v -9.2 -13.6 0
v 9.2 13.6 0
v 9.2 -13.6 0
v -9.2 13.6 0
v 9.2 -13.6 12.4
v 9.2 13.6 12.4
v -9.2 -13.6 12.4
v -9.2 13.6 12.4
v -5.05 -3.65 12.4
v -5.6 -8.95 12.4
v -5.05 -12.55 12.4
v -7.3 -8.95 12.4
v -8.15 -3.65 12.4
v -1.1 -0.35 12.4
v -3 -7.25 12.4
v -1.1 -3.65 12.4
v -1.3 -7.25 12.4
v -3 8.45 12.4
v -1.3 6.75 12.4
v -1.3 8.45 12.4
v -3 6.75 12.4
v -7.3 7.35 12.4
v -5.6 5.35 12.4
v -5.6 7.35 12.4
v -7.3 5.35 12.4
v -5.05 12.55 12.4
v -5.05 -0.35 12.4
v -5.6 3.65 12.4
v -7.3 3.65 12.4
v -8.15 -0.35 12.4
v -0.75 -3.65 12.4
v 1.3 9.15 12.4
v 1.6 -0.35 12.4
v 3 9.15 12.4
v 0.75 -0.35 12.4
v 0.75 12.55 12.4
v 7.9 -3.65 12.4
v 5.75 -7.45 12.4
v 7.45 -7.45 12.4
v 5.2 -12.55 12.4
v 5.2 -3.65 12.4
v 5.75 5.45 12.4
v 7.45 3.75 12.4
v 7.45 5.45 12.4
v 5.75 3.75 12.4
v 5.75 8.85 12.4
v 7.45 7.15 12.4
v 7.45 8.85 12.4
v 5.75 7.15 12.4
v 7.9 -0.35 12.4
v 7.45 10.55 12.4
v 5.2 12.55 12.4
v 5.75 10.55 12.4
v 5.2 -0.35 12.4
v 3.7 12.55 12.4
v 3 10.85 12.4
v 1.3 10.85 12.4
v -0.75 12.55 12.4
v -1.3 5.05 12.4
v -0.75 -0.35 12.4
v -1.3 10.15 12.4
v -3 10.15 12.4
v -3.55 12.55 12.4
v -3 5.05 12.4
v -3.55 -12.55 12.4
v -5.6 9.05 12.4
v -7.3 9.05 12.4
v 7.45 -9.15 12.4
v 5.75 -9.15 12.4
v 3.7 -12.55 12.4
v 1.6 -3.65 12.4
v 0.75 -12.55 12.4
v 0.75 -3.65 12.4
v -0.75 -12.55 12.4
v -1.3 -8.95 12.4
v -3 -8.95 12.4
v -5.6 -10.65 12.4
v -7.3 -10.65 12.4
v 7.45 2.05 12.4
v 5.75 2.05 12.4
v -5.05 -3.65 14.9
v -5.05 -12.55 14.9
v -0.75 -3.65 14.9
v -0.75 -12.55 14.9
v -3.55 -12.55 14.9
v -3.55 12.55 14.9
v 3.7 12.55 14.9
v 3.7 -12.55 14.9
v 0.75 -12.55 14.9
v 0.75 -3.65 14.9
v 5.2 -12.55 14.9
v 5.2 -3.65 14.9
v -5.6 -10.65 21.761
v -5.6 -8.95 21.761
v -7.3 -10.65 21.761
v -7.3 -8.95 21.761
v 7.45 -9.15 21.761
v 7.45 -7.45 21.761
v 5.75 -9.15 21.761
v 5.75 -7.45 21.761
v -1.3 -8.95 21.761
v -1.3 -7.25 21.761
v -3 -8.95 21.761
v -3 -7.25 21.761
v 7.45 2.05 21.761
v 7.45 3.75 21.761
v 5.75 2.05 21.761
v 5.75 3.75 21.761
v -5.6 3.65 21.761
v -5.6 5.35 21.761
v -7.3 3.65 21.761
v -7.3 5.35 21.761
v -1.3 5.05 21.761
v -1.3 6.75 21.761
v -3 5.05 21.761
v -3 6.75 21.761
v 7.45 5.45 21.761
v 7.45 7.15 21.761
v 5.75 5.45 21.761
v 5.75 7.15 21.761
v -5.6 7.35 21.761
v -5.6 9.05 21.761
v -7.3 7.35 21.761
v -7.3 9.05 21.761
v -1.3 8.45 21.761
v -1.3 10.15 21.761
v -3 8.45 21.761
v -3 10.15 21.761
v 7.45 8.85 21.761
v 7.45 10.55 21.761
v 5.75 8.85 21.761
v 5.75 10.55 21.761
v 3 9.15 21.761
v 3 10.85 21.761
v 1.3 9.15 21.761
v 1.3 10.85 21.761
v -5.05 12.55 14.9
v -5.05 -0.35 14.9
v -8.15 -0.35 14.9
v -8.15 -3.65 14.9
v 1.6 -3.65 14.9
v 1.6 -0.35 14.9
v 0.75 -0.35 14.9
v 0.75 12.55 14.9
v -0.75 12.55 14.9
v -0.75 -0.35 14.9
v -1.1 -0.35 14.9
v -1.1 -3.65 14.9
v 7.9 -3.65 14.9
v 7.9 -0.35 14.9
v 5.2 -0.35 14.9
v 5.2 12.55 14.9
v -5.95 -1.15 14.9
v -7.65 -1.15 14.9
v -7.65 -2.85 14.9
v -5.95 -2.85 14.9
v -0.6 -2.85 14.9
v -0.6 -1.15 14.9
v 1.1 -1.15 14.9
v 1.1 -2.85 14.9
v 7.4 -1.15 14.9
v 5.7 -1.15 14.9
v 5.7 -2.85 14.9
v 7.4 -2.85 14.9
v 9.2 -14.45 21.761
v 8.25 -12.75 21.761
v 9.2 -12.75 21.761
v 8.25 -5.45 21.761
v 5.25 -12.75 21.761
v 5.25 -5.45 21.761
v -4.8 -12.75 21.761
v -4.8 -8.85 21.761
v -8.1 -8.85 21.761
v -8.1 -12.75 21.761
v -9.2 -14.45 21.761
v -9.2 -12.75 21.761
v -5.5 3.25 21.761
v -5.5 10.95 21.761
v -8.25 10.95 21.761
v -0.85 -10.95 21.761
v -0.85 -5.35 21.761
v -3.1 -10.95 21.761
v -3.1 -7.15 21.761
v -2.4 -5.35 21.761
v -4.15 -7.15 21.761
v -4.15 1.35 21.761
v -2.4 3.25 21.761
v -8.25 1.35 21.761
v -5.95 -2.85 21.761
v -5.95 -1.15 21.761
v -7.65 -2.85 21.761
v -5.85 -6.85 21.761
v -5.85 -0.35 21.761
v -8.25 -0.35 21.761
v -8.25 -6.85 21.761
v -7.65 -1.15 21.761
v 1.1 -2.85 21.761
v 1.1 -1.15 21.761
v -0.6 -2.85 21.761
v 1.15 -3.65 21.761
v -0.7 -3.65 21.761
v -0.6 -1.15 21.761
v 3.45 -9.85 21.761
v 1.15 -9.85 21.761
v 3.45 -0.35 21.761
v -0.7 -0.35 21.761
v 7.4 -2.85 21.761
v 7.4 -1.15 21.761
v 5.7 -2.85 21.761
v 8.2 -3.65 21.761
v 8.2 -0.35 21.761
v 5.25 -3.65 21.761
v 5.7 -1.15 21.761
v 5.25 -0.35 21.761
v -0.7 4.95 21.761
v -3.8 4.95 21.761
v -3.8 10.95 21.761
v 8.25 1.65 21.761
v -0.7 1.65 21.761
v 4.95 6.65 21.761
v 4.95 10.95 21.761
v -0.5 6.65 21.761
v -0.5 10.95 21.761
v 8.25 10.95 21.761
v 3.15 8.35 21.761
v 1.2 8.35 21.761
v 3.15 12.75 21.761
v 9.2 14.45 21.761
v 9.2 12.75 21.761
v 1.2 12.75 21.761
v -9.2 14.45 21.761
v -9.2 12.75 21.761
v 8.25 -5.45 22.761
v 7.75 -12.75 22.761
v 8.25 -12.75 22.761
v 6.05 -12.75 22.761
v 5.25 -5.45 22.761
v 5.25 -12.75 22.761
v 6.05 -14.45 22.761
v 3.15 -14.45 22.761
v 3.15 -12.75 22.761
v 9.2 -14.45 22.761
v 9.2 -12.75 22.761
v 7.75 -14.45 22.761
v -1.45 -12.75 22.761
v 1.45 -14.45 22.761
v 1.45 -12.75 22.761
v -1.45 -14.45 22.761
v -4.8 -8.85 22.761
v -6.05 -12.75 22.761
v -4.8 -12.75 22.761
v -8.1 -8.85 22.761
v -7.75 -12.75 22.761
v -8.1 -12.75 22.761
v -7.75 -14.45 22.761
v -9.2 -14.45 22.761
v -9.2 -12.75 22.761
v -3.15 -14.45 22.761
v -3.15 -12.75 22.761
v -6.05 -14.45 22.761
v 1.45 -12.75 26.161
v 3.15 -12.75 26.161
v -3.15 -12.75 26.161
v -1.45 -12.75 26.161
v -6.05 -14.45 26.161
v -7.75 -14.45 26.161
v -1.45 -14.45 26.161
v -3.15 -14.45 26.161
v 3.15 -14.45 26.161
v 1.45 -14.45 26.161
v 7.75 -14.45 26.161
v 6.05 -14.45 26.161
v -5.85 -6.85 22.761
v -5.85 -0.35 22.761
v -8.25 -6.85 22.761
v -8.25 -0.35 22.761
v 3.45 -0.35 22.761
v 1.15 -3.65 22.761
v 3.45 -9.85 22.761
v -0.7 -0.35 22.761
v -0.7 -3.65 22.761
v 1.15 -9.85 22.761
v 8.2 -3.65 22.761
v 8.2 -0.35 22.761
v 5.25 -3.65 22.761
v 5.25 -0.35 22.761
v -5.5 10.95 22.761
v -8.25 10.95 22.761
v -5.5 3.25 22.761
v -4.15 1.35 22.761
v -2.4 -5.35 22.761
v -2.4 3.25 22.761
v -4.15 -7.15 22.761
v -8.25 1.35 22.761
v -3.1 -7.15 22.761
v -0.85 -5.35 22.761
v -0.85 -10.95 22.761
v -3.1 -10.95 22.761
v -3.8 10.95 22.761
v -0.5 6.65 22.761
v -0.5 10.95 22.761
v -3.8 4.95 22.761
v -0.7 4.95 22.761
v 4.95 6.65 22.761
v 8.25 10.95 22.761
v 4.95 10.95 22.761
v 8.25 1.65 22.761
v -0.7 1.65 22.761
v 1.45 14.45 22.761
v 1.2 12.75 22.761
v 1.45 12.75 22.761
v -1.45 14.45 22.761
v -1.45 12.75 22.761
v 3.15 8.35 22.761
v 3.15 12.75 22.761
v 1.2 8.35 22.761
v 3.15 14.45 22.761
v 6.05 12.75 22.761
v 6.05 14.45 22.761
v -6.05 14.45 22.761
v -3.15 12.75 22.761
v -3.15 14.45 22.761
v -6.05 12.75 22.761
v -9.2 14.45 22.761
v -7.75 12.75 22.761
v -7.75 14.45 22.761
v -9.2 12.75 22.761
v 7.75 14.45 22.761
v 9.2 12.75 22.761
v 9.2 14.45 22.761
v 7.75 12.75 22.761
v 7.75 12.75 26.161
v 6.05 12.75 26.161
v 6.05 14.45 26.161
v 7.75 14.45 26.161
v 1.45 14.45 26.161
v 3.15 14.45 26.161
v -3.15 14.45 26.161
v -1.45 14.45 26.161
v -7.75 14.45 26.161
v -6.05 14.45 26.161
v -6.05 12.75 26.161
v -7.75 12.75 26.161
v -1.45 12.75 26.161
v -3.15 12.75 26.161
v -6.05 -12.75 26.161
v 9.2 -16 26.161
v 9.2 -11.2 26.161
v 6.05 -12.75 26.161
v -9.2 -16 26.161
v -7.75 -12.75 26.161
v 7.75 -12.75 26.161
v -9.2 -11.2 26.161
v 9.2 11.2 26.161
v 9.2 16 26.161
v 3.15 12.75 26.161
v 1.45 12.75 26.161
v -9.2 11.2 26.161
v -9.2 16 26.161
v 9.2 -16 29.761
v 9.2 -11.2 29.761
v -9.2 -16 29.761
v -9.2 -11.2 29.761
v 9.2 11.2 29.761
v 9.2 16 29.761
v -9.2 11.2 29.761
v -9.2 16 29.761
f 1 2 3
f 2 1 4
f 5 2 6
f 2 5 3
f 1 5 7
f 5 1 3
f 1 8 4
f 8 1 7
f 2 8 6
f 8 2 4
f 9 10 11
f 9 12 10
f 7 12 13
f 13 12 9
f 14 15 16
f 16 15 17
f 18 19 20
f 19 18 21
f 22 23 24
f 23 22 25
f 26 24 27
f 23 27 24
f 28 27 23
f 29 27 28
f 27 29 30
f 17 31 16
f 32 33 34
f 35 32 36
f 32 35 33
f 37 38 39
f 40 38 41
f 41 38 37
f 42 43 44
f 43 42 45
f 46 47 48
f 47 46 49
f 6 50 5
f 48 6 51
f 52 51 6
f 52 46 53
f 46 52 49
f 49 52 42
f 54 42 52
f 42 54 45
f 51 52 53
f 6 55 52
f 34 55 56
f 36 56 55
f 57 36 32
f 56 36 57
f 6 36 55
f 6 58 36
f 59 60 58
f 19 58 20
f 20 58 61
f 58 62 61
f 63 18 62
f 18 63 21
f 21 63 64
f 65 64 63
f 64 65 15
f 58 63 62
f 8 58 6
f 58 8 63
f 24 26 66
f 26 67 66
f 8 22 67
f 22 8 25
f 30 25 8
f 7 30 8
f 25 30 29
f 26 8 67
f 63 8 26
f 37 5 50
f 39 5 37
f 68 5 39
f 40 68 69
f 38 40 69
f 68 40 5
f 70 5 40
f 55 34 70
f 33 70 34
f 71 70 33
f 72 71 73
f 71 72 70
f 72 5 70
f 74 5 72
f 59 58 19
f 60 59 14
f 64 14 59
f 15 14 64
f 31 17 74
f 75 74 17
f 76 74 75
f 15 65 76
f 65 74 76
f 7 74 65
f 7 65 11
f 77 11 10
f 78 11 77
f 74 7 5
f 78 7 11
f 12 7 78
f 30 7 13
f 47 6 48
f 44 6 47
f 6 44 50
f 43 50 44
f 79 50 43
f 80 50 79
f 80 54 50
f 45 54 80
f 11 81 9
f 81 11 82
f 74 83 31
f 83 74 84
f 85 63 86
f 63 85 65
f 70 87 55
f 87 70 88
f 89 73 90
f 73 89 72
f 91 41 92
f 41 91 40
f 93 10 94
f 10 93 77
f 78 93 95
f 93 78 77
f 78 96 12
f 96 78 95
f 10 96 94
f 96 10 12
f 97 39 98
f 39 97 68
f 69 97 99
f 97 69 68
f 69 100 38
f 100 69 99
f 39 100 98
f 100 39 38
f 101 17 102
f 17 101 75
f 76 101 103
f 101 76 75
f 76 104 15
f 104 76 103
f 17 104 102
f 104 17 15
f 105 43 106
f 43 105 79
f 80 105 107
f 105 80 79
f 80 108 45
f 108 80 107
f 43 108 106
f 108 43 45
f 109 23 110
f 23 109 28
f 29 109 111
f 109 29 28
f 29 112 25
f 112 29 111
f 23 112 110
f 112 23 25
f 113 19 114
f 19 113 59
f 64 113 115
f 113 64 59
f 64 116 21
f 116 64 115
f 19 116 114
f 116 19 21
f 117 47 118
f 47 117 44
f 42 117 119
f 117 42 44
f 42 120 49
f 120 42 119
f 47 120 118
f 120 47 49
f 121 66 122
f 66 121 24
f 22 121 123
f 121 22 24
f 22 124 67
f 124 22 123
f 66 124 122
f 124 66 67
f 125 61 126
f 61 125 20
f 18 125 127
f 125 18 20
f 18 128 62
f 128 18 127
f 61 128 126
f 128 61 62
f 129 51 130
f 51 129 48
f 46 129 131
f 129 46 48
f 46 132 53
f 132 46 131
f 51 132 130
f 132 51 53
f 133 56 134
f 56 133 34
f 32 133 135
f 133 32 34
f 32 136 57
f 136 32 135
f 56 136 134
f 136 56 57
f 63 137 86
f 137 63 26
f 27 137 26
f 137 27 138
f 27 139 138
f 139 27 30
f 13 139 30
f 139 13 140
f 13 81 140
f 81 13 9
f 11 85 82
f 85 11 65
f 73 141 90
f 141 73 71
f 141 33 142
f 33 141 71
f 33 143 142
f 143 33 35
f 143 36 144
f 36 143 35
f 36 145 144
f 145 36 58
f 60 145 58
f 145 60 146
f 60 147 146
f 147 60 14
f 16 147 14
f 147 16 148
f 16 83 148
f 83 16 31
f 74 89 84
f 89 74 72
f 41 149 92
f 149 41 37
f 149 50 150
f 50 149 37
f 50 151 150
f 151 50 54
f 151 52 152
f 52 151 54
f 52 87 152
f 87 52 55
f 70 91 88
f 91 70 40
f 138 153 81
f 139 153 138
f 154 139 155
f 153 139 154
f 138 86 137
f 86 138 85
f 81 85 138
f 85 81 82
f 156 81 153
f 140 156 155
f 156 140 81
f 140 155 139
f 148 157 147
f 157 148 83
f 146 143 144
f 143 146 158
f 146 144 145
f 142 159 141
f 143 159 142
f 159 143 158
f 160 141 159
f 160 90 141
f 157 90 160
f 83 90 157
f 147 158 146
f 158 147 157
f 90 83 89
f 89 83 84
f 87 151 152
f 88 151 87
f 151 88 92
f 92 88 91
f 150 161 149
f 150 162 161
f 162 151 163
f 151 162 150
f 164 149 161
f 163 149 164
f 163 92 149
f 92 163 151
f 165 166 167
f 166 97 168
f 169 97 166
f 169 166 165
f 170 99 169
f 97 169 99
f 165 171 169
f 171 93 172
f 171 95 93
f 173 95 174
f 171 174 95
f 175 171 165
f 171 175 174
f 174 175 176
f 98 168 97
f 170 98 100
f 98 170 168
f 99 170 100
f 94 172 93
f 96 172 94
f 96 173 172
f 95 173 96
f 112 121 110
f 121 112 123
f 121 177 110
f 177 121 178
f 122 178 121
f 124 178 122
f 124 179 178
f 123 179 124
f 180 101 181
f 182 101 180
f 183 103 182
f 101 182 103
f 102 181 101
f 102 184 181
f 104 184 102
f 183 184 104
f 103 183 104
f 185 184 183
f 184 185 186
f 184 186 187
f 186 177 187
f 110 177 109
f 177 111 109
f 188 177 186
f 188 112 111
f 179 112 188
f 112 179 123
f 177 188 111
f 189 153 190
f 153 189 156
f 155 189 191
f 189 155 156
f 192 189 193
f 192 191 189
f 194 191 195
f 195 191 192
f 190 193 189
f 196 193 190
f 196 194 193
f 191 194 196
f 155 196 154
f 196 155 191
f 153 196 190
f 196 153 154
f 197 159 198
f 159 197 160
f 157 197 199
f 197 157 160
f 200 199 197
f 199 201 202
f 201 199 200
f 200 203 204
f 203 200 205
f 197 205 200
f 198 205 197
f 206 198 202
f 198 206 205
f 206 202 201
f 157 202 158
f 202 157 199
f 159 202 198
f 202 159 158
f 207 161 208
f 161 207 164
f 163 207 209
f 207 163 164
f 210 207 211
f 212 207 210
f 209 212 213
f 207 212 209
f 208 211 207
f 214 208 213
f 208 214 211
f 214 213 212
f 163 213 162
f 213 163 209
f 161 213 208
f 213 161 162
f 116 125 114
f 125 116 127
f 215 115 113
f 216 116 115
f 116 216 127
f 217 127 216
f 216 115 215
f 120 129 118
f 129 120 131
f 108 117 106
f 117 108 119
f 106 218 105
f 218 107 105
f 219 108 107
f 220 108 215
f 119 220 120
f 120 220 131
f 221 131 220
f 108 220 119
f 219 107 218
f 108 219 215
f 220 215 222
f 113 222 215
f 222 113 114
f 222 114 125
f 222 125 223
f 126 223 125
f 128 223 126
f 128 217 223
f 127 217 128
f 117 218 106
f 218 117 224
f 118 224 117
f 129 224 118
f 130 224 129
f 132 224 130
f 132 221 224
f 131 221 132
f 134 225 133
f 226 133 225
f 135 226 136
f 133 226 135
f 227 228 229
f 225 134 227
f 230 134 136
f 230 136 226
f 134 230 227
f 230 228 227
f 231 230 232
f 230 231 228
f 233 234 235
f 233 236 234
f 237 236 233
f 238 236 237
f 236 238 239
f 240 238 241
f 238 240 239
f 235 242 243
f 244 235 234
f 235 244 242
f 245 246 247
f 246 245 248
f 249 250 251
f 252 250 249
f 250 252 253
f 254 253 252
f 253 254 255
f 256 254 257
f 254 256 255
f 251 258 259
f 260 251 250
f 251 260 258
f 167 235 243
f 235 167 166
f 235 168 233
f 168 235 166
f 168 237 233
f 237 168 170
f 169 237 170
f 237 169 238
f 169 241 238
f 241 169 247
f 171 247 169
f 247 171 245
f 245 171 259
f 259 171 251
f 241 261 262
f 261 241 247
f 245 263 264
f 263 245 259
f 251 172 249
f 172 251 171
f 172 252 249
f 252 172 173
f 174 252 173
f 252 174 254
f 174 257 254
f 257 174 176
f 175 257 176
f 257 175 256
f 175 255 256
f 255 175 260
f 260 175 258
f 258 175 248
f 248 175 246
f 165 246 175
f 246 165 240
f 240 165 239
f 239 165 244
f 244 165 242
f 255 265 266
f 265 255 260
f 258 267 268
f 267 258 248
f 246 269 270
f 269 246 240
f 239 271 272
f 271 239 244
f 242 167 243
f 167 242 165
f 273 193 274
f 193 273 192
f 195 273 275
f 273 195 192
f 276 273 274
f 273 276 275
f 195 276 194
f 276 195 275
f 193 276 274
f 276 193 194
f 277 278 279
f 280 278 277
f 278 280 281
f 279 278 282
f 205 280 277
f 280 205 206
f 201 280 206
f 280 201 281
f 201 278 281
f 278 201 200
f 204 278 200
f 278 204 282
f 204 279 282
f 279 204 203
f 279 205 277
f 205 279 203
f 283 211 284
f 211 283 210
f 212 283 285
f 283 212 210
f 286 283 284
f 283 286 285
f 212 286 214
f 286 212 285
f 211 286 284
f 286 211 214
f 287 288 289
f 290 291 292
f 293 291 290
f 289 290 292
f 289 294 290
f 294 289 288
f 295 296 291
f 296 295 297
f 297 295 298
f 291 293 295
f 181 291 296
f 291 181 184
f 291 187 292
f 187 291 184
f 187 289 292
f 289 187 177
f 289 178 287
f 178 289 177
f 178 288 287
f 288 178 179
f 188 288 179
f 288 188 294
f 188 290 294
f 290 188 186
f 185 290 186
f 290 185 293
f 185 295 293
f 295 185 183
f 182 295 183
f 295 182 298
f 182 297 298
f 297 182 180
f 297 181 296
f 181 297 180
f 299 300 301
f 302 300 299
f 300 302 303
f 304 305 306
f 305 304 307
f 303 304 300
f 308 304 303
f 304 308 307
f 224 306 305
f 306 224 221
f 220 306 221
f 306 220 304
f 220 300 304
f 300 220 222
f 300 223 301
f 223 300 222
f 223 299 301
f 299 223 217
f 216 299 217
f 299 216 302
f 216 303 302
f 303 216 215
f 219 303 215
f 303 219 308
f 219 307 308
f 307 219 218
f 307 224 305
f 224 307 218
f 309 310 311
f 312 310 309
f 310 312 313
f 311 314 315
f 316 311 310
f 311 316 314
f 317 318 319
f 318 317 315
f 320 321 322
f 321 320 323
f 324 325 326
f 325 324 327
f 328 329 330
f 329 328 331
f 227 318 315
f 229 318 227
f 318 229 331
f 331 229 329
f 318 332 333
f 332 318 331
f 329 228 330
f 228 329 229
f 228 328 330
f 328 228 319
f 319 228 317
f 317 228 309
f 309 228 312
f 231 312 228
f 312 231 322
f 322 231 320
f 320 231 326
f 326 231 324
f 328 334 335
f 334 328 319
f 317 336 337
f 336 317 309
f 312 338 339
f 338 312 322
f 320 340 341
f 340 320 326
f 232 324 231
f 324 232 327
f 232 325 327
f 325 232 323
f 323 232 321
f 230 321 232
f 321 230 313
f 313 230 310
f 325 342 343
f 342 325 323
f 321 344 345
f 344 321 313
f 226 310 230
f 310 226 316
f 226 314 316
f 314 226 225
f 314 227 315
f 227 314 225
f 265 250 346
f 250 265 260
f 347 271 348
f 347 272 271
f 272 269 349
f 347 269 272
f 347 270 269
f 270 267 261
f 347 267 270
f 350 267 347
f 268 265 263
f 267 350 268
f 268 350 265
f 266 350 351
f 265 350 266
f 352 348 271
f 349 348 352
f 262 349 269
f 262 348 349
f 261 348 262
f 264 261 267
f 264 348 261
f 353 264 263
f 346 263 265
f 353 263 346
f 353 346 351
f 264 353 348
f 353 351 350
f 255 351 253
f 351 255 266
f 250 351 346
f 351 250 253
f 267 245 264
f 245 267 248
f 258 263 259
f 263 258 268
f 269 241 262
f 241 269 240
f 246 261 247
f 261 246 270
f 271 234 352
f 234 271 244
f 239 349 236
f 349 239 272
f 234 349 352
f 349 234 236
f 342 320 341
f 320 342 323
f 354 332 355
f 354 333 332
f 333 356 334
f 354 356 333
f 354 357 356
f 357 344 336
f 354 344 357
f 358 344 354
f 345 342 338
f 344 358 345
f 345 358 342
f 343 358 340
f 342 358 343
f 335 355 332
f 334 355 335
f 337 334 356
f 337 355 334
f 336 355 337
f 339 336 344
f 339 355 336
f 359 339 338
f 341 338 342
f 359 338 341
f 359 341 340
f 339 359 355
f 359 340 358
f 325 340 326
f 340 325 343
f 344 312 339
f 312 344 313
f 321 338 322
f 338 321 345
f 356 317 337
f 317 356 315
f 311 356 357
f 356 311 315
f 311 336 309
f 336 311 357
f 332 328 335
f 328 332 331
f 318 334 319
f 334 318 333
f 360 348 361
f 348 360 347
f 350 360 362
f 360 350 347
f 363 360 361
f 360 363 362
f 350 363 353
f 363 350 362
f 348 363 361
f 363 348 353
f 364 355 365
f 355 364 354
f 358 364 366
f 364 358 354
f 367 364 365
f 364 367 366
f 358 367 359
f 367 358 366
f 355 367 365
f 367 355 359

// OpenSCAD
// Generated by SolidPython 0.4.2 on 2020-09-29 23:19:43
//!OpenSCAD

scale(v = 0.0100000000) {
	translate(v = [-920, -1360, 0]) {
		union() {
			color(c = [0.4000000000, 0.4000000000, 0.4000000000]) {
				translate(v = [0, 0, 0]) {
					linear_extrude(height = 1000.0000000000) {
						polygon(paths = [[0, 1, 2, 3]], points = [[0, 0], [0, 2720], [1840, 2720], [1840, 0]]);
					}
				}
			}
			color(c = [0.2000000000, 0.6000000000, 0.2000000000]) {
				translate(v = [0, 0, 1000.0000000000]) {
					linear_extrude(height = 120.0000000000) {
						polygon(paths = [[0, 1, 2, 3]], points = [[0, 1305], [0, 2720], [1840, 2720], [1840, 1305]]);
					}
				}
			}
			color(c = [0.4000000000, 0.4000000000, 0.4000000000]) {
				translate(v = [0, 0, 1000.0000000000]) {
					linear_extrude(height = 120.0000000000) {
						polygon(paths = [[0, 1, 2, 3]], points = [[0, 0], [0, 1305], [1840, 1305], [1840, 0]]);
					}
				}
			}
			color(c = [0.9000000000, 0.6000000000, 0.6000000000]) {
				translate(v = [0, 0, 1120.0000000000]) {
					linear_extrude(height = 120.0000000000) {
						polygon(paths = [[0, 1, 2, 3]], points = [[150, 1485], [150, 2485], [415, 2485], [415, 1485]]);
					}
				}
			}
			color(c = [0.9000000000, 0.6000000000, 0.6000000000]) {
				translate(v = [0, 0, 1120.0000000000]) {
					linear_extrude(height = 120.0000000000) {
						polygon(paths = [[0, 1, 2, 3]], points = [[565, 1485], [565, 2485], [845, 2485], [845, 1485]]);
					}
				}
			}
			color(c = [0.9000000000, 0.6000000000, 0.6000000000]) {
				translate(v = [0, 0, 1120.0000000000]) {
					linear_extrude(height = 120.0000000000) {
						polygon(paths = [[0, 1, 2, 3]], points = [[995, 1485], [995, 2485], [1290, 2485], [1290, 1485]]);
					}
				}
			}
			color(c = [0.9000000000, 0.6000000000, 0.6000000000]) {
				translate(v = [0, 0, 1120.0000000000]) {
					linear_extrude(height = 120.0000000000) {
						polygon(paths = [[0, 1, 2, 3]], points = [[1440, 1485], [1440, 2485], [1705, 2485], [1705, 1485]]);
					}
				}
			}
			color(c = [0.9000000000, 0.6000000000, 0.9000000000]) {
				translate(v = [0, 0, 1120.0000000000]) {
					linear_extrude(height = 120.0000000000) {
						polygon(paths = [[0, 1, 2, 3]], points = [[150, 235], [150, 885], [415, 885], [415, 235]]);
					}
				}
			}
			color(c = [0.9000000000, 0.6000000000, 0.9000000000]) {
				translate(v = [0, 0, 1120.0000000000]) {
					linear_extrude(height = 120.0000000000) {
						polygon(paths = [[0, 1, 2, 3]], points = [[565, 235], [565, 885], [845, 885], [845, 235]]);
					}
				}
			}
			color(c = [0.9000000000, 0.6000000000, 0.9000000000]) {
				translate(v = [0, 0, 1120.0000000000]) {
					linear_extrude(height = 120.0000000000) {
						polygon(paths = [[0, 1, 2, 3]], points = [[995, 235], [995, 885], [1290, 885], [1290, 235]]);
					}
				}
			}
			color(c = [0.9000000000, 0.6000000000, 0.9000000000]) {
				translate(v = [0, 0, 1120.0000000000]) {
					linear_extrude(height = 120.0000000000) {
						polygon(paths = [[0, 1, 2, 3]], points = [[1440, 235], [1440, 885], [1705, 885], [1705, 235]]);
					}
				}
			}
			color(c = [0.2000000000, 0.6000000000, 0.2000000000]) {
				translate(v = [0, 0, 1120.0000000000]) {
					linear_extrude(height = 120.0000000000) {
						difference() {
							polygon(paths = [[0, 1, 2, 3]], points = [[0, 1305], [0, 2720], [1840, 2720], [1840, 1305]]);
							polygon(paths = [[0, 1, 2, 3]], points = [[150, 1485], [415, 1485], [415, 2485], [150, 2485]]);
							polygon(paths = [[0, 1, 2, 3]], points = [[565, 1485], [845, 1485], [845, 2485], [565, 2485]]);
							polygon(paths = [[0, 1, 2, 3]], points = [[995, 1485], [1290, 1485], [1290, 2485], [995, 2485]]);
							polygon(paths = [[0, 1, 2, 3]], points = [[1440, 1485], [1705, 1485], [1705, 2485], [1440, 2485]]);
						}
					}
				}
			}
			color(c = [0.4000000000, 0.4000000000, 0.4000000000]) {
				translate(v = [0, 0, 1120.0000000000]) {
					linear_extrude(height = 120.0000000000) {
						difference() {
							polygon(paths = [[0, 1, 2, 3]], points = [[0, 0], [0, 1305], [1840, 1305], [1840, 0]]);
							polygon(paths = [[0, 1, 2, 3]], points = [[150, 235], [415, 235], [415, 885], [150, 885]]);
							polygon(paths = [[0, 1, 2, 3]], points = [[565, 235], [845, 235], [845, 885], [565, 885]]);
							polygon(paths = [[0, 1, 2, 3]], points = [[995, 235], [1290, 235], [1290, 885], [995, 885]]);
							polygon(paths = [[0, 1, 2, 3]], points = [[1440, 235], [1705, 235], [1705, 885], [1440, 885]]);
						}
					}
				}
			}
			color(c = [0.1000000000, 0.1000000000, 0.1000000000]) {
				translate(v = [0, 0, 1240.0000000000]) {
					linear_extrude(height = 70.0000000000) {
						polygon(paths = [[0, 1, 2, 3]], points = [[190, 295], [190, 465], [360, 465], [360, 295]]);
					}
				}
			}
			color(c = [0.1000000000, 0.1000000000, 0.1000000000]) {
				translate(v = [0, 0, 1240.0000000000]) {
					linear_extrude(height = 70.0000000000) {
						polygon(paths = [[0, 1, 2, 3]], points = [[1495, 445], [1495, 615], [1665, 615], [1665, 445]]);
					}
				}
			}
			color(c = [0.1000000000, 0.1000000000, 0.1000000000]) {
				translate(v = [0, 0, 1240.0000000000]) {
					linear_extrude(height = 70.0000000000) {
						polygon(paths = [[0, 1, 2, 3]], points = [[620, 465], [620, 635], [790, 635], [790, 465]]);
					}
				}
			}
			color(c = [0.1000000000, 0.1000000000, 0.1000000000]) {
				translate(v = [0, 0, 1240.0000000000]) {
					linear_extrude(height = 70.0000000000) {
						polygon(paths = [[0, 1, 2, 3]], points = [[1495, 1565], [1495, 1735], [1665, 1735], [1665, 1565]]);
					}
				}
			}
			color(c = [0.1000000000, 0.1000000000, 0.1000000000]) {
				translate(v = [0, 0, 1240.0000000000]) {
					linear_extrude(height = 70.0000000000) {
						polygon(paths = [[0, 1, 2, 3]], points = [[190, 1725], [190, 1895], [360, 1895], [360, 1725]]);
					}
				}
			}
			color(c = [0.1000000000, 0.1000000000, 0.1000000000]) {
				translate(v = [0, 0, 1240.0000000000]) {
					linear_extrude(height = 70.0000000000) {
						polygon(paths = [[0, 1, 2, 3]], points = [[620, 1865], [620, 2035], [790, 2035], [790, 1865]]);
					}
				}
			}
			color(c = [0.1000000000, 0.1000000000, 0.1000000000]) {
				translate(v = [0, 0, 1240.0000000000]) {
					linear_extrude(height = 70.0000000000) {
						polygon(paths = [[0, 1, 2, 3]], points = [[1495, 1905], [1495, 2075], [1665, 2075], [1665, 1905]]);
					}
				}
			}
			color(c = [0.1000000000, 0.1000000000, 0.1000000000]) {
				translate(v = [0, 0, 1240.0000000000]) {
					linear_extrude(height = 70.0000000000) {
						polygon(paths = [[0, 1, 2, 3]], points = [[190, 2095], [190, 2265], [360, 2265], [360, 2095]]);
					}
				}
			}
			color(c = [0.1000000000, 0.1000000000, 0.1000000000]) {
				translate(v = [0, 0, 1240.0000000000]) {
					linear_extrude(height = 70.0000000000) {
						polygon(paths = [[0, 1, 2, 3]], points = [[620, 2205], [620, 2375], [790, 2375], [790, 2205]]);
					}
				}
			}
			color(c = [0.1000000000, 0.1000000000, 0.1000000000]) {
				translate(v = [0, 0, 1240.0000000000]) {
					linear_extrude(height = 70.0000000000) {
						polygon(paths = [[0, 1, 2, 3]], points = [[1495, 2245], [1495, 2415], [1665, 2415], [1665, 2245]]);
					}
				}
			}
			color(c = [0.1000000000, 0.1000000000, 0.1000000000]) {
				translate(v = [0, 0, 1240.0000000000]) {
					linear_extrude(height = 70.0000000000) {
						polygon(paths = [[0, 1, 2, 3]], points = [[1050, 2275], [1050, 2445], [1220, 2445], [1220, 2275]]);
					}
				}
			}
			color(c = [1.0000000000, 1.0000000000, 1.0000000000]) {
				translate(v = [0, 0, 1240.0000000000]) {
					linear_extrude(height = 70.0000000000) {
						polygon(paths = [[0, 1, 2, 3, 4, 5, 6, 7]], points = [[415, 105], [415, 995], [105, 995], [105, 1325], [415, 1325], [415, 2615], [565, 2615], [565, 105]]);
					}
				}
			}
			color(c = [1.0000000000, 1.0000000000, 1.0000000000]) {
				translate(v = [0, 0, 1240.0000000000]) {
					linear_extrude(height = 70.0000000000) {
						polygon(paths = [[0, 1, 2, 3, 4, 5, 6, 7, 8, 9, 10, 11]], points = [[845, 105], [845, 995], [810, 995], [810, 1325], [845, 1325], [845, 2615], [995, 2615], [995, 1325], [1080, 1325], [1080, 995], [995, 995], [995, 105]]);
					}
				}
			}
			color(c = [1.0000000000, 1.0000000000, 1.0000000000]) {
				translate(v = [0, 0, 1240.0000000000]) {
					linear_extrude(height = 70.0000000000) {
						polygon(paths = [[0, 1, 2, 3, 4, 5, 6, 7]], points = [[1290, 105], [1290, 2615], [1440, 2615], [1440, 1325], [1710, 1325], [1710, 995], [1440, 995], [1440, 105]]);
					}
				}
			}
			color(c = [0.1000000000, 0.1000000000, 0.1000000000]) {
				translate(v = [0, 0, 1310.0000000000]) {
					linear_extrude(height = 180.0000000000) {
						polygon(paths = [[0, 1, 2, 3]], points = [[190, 295], [190, 465], [360, 465], [360, 295]]);
					}
				}
			}
			color(c = [0.1000000000, 0.1000000000, 0.1000000000]) {
				translate(v = [0, 0, 1310.0000000000]) {
					linear_extrude(height = 180.0000000000) {
						polygon(paths = [[0, 1, 2, 3]], points = [[1495, 445], [1495, 615], [1665, 615], [1665, 445]]);
					}
				}
			}
			color(c = [0.1000000000, 0.1000000000, 0.1000000000]) {
				translate(v = [0, 0, 1310.0000000000]) {
					linear_extrude(height = 180.0000000000) {
						polygon(paths = [[0, 1, 2, 3]], points = [[620, 465], [620, 635], [790, 635], [790, 465]]);
					}
				}
			}
			color(c = [0.1000000000, 0.1000000000, 0.1000000000]) {
				translate(v = [0, 0, 1310.0000000000]) {
					linear_extrude(height = 180.0000000000) {
						polygon(paths = [[0, 1, 2, 3]], points = [[1495, 1565], [1495, 1735], [1665, 1735], [1665, 1565]]);
					}
				}
			}
			color(c = [0.1000000000, 0.1000000000, 0.1000000000]) {
				translate(v = [0, 0, 1310.0000000000]) {
					linear_extrude(height = 180.0000000000) {
						polygon(paths = [[0, 1, 2, 3]], points = [[190, 1725], [190, 1895], [360, 1895], [360, 1725]]);
					}
				}
			}
			color(c = [0.1000000000, 0.1000000000, 0.1000000000]) {
				translate(v = [0, 0, 1310.0000000000]) {
					linear_extrude(height = 180.0000000000) {
						polygon(paths = [[0, 1, 2, 3]], points = [[620, 1865], [620, 2035], [790, 2035], [790, 1865]]);
					}
				}
			}
			color(c = [0.1000000000, 0.1000000000, 0.1000000000]) {
				translate(v = [0, 0, 1310.0000000000]) {
					linear_extrude(height = 180.0000000000) {
						polygon(paths = [[0, 1, 2, 3]], points = [[1495, 1905], [1495, 2075], [1665, 2075], [1665, 1905]]);
					}
				}
			}
			color(c = [0.1000000000, 0.1000000000, 0.1000000000]) {
				translate(v = [0, 0, 1310.0000000000]) {
					linear_extrude(height = 180.0000000000) {
						polygon(paths = [[0, 1, 2, 3]], points = [[190, 2095], [190, 2265], [360, 2265], [360, 2095]]);
					}
				}
			}
			color(c = [0.1000000000, 0.1000000000, 0.1000000000]) {
				translate(v = [0, 0, 1310.0000000000]) {
					linear_extrude(height = 180.0000000000) {
						polygon(paths = [[0, 1, 2, 3]], points = [[620, 2205], [620, 2375], [790, 2375], [790, 2205]]);
					}
				}
			}
			color(c = [0.1000000000, 0.1000000000, 0.1000000000]) {
				translate(v = [0, 0, 1310.0000000000]) {
					linear_extrude(height = 180.0000000000) {
						polygon(paths = [[0, 1, 2, 3]], points = [[1495, 2245], [1495, 2415], [1665, 2415], [1665, 2245]]);
					}
				}
			}
			color(c = [0.1000000000, 0.1000000000, 0.1000000000]) {
				translate(v = [0, 0, 1310.0000000000]) {
					linear_extrude(height = 180.0000000000) {
						polygon(paths = [[0, 1, 2, 3]], points = [[1050, 2275], [1050, 2445], [1220, 2445], [1220, 2275]]);
					}
				}
			}
			color(c = [0.7000000000, 0, 0]) {
				translate(v = [0, 0, 1310.0000000000]) {
					linear_extrude(height = 180.0000000000) {
						polygon(paths = [[0, 1, 2, 3, 4, 5, 6, 7]], points = [[415, 105], [415, 995], [105, 995], [105, 1325], [415, 1325], [415, 2615], [565, 2615], [565, 105]]);
					}
				}
			}
			color(c = [0.7000000000, 0, 0]) {
				translate(v = [0, 0, 1310.0000000000]) {
					linear_extrude(height = 180.0000000000) {
						polygon(paths = [[0, 1, 2, 3, 4, 5, 6, 7, 8, 9, 10, 11]], points = [[845, 105], [845, 995], [810, 995], [810, 1325], [845, 1325], [845, 2615], [995, 2615], [995, 1325], [1080, 1325], [1080, 995], [995, 995], [995, 105]]);
					}
				}
			}
			color(c = [0.7000000000, 0, 0]) {
				translate(v = [0, 0, 1310.0000000000]) {
					linear_extrude(height = 180.0000000000) {
						polygon(paths = [[0, 1, 2, 3, 4, 5, 6, 7]], points = [[1290, 105], [1290, 2615], [1440, 2615], [1440, 1325], [1710, 1325], [1710, 995], [1440, 995], [1440, 105]]);
					}
				}
			}
			color(c = [0.1000000000, 0.1000000000, 0.1000000000]) {
				translate(v = [0, 0, 1490.0000000000]) {
					linear_extrude(height = 686.1000000000) {
						polygon(paths = [[0, 1, 2, 3]], points = [[190, 295], [190, 465], [360, 465], [360, 295]]);
					}
				}
			}
			color(c = [0.1000000000, 0.1000000000, 0.1000000000]) {
				translate(v = [0, 0, 1490.0000000000]) {
					linear_extrude(height = 686.1000000000) {
						polygon(paths = [[0, 1, 2, 3]], points = [[1495, 445], [1495, 615], [1665, 615], [1665, 445]]);
					}
				}
			}
			color(c = [0.1000000000, 0.1000000000, 0.1000000000]) {
				translate(v = [0, 0, 1490.0000000000]) {
					linear_extrude(height = 686.1000000000) {
						polygon(paths = [[0, 1, 2, 3]], points = [[620, 465], [620, 635], [790, 635], [790, 465]]);
					}
				}
			}
			color(c = [0.1000000000, 0.1000000000, 0.1000000000]) {
				translate(v = [0, 0, 1490.0000000000]) {
					linear_extrude(height = 686.1000000000) {
						polygon(paths = [[0, 1, 2, 3]], points = [[155, 1075], [155, 1245], [325, 1245], [325, 1075]]);
					}
				}
			}
			color(c = [0.1000000000, 0.1000000000, 0.1000000000]) {
				translate(v = [0, 0, 1490.0000000000]) {
					linear_extrude(height = 686.1000000000) {
						polygon(paths = [[0, 1, 2, 3]], points = [[860, 1075], [860, 1245], [1030, 1245], [1030, 1075]]);
					}
				}
			}
			color(c = [0.1000000000, 0.1000000000, 0.1000000000]) {
				translate(v = [0, 0, 1490.0000000000]) {
					linear_extrude(height = 686.1000000000) {
						polygon(paths = [[0, 1, 2, 3]], points = [[1490, 1075], [1490, 1245], [1660, 1245], [1660, 1075]]);
					}
				}
			}
			color(c = [0.1000000000, 0.1000000000, 0.1000000000]) {
				translate(v = [0, 0, 1490.0000000000]) {
					linear_extrude(height = 686.1000000000) {
						polygon(paths = [[0, 1, 2, 3]], points = [[1495, 1565], [1495, 1735], [1665, 1735], [1665, 1565]]);
					}
				}
			}
			color(c = [0.1000000000, 0.1000000000, 0.1000000000]) {
				translate(v = [0, 0, 1490.0000000000]) {
					linear_extrude(height = 686.1000000000) {
						polygon(paths = [[0, 1, 2, 3]], points = [[190, 1725], [190, 1895], [360, 1895], [360, 1725]]);
					}
				}
			}
			color(c = [0.1000000000, 0.1000000000, 0.1000000000]) {
				translate(v = [0, 0, 1490.0000000000]) {
					linear_extrude(height = 686.1000000000) {
						polygon(paths = [[0, 1, 2, 3]], points = [[620, 1865], [620, 2035], [790, 2035], [790, 1865]]);
					}
				}
			}
			color(c = [0.1000000000, 0.1000000000, 0.1000000000]) {
				translate(v = [0, 0, 1490.0000000000]) {
					linear_extrude(height = 686.1000000000) {
						polygon(paths = [[0, 1, 2, 3]], points = [[1495, 1905], [1495, 2075], [1665, 2075], [1665, 1905]]);
					}
				}
			}
			color(c = [0.1000000000, 0.1000000000, 0.1000000000]) {
				translate(v = [0, 0, 1490.0000000000]) {
					linear_extrude(height = 686.1000000000) {
						polygon(paths = [[0, 1, 2, 3]], points = [[190, 2095], [190, 2265], [360, 2265], [360, 2095]]);
					}
				}
			}
			color(c = [0.1000000000, 0.1000000000, 0.1000000000]) {
				translate(v = [0, 0, 1490.0000000000]) {
					linear_extrude(height = 686.1000000000) {
						polygon(paths = [[0, 1, 2, 3]], points = [[620, 2205], [620, 2375], [790, 2375], [790, 2205]]);
					}
				}
			}
			color(c = [0.1000000000, 0.1000000000, 0.1000000000]) {
				translate(v = [0, 0, 1490.0000000000]) {
					linear_extrude(height = 686.1000000000) {
						polygon(paths = [[0, 1, 2, 3]], points = [[1495, 2245], [1495, 2415], [1665, 2415], [1665, 2245]]);
					}
				}
			}
			color(c = [0.1000000000, 0.1000000000, 0.1000000000]) {
				translate(v = [0, 0, 1490.0000000000]) {
					linear_extrude(height = 686.1000000000) {
						polygon(paths = [[0, 1, 2, 3]], points = [[1050, 2275], [1050, 2445], [1220, 2445], [1220, 2275]]);
					}
				}
			}
			color(c = [0.9000000000, 0.6000000000, 0.6000000000]) {
				translate(v = [0, 0, 2176.1000000000]) {
					linear_extrude(height = 100.0000000000) {
						polygon(paths = [[0, 1, 2, 3, 4, 5, 6, 7, 8, 9, 10, 11]], points = [[0, -85], [0, 85], [110, 85], [110, 475], [440, 475], [440, 85], [1445, 85], [1445, 815], [1745, 815], [1745, 85], [1840, 85], [1840, -85]]);
					}
				}
			}
			color(c = [0.9000000000, 0.6000000000, 0.6000000000]) {
				translate(v = [0, 0, 2176.1000000000]) {
					linear_extrude(height = 100.0000000000) {
						polygon(paths = [[0, 1, 2, 3]], points = [[95, 675], [95, 1325], [335, 1325], [335, 675]]);
					}
				}
			}
			color(c = [0.9000000000, 0.6000000000, 0.6000000000]) {
				translate(v = [0, 0, 2176.1000000000]) {
					linear_extrude(height = 100.0000000000) {
						polygon(paths = [[0, 1, 2, 3, 4, 5]], points = [[1035, 375], [1035, 995], [850, 995], [850, 1325], [1265, 1325], [1265, 375]]);
					}
				}
			}
			color(c = [0.9000000000, 0.6000000000, 0.6000000000]) {
				translate(v = [0, 0, 2176.1000000000]) {
					linear_extrude(height = 100.0000000000) {
						polygon(paths = [[0, 1, 2, 3]], points = [[1445, 995], [1445, 1325], [1740, 1325], [1740, 995]]);
					}
				}
			}
			color(c = [0.9000000000, 0.6000000000, 0.6000000000]) {
				translate(v = [0, 0, 2176.1000000000]) {
					linear_extrude(height = 100.0000000000) {
						polygon(paths = [[0, 1, 2, 3, 4, 5, 6, 7, 8, 9, 10, 11]], points = [[610, 265], [610, 645], [505, 645], [505, 1495], [95, 1495], [95, 2455], [370, 2455], [370, 1685], [680, 1685], [680, 825], [835, 825], [835, 265]]);
					}
				}
			}
			color(c = [0.9000000000, 0.6000000000, 0.6000000000]) {
				translate(v = [0, 0, 2176.1000000000]) {
					linear_extrude(height = 100.0000000000) {
						polygon(paths = [[0, 1, 2, 3, 4, 5, 6, 7, 8, 9]], points = [[850, 1525], [850, 1855], [540, 1855], [540, 2455], [870, 2455], [870, 2025], [1415, 2025], [1415, 2455], [1745, 2455], [1745, 1525]]);
					}
				}
			}
			color(c = [0.9000000000, 0.6000000000, 0.6000000000]) {
				translate(v = [0, 0, 2176.1000000000]) {
					linear_extrude(height = 100.0000000000) {
						polygon(paths = [[0, 1, 2, 3, 4, 5, 6, 7]], points = [[1040, 2195], [1040, 2635], [0, 2635], [0, 2805], [1840, 2805], [1840, 2635], [1235, 2635], [1235, 2195]]);
					}
				}
			}
			color(c = [0.5000000000, 0.5000000000, 0.5000000000]) {
				translate(v = [0, 0, 2276.1000000000]) {
					linear_extrude(height = 340.0000000000) {
						polygon(paths = [[0, 1, 2, 3]], points = [[145, -85], [145, 85], [315, 85], [315, -85]]);
					}
				}
			}
			color(c = [0.5000000000, 0.5000000000, 0.5000000000]) {
				translate(v = [0, 0, 2276.1000000000]) {
					linear_extrude(height = 340.0000000000) {
						polygon(paths = [[0, 1, 2, 3]], points = [[605, -85], [605, 85], [775, 85], [775, -85]]);
					}
				}
			}
			color(c = [0.5000000000, 0.5000000000, 0.5000000000]) {
				translate(v = [0, 0, 2276.1000000000]) {
					linear_extrude(height = 340.0000000000) {
						polygon(paths = [[0, 1, 2, 3]], points = [[1065, -85], [1065, 85], [1235, 85], [1235, -85]]);
					}
				}
			}
			color(c = [0.5000000000, 0.5000000000, 0.5000000000]) {
				translate(v = [0, 0, 2276.1000000000]) {
					linear_extrude(height = 340.0000000000) {
						polygon(paths = [[0, 1, 2, 3]], points = [[1525, -85], [1525, 85], [1695, 85], [1695, -85]]);
					}
				}
			}
			color(c = [0.5000000000, 0.5000000000, 0.5000000000]) {
				translate(v = [0, 0, 2276.1000000000]) {
					linear_extrude(height = 340.0000000000) {
						polygon(paths = [[0, 1, 2, 3]], points = [[145, 2635], [145, 2805], [315, 2805], [315, 2635]]);
					}
				}
			}
			color(c = [0.5000000000, 0.5000000000, 0.5000000000]) {
				translate(v = [0, 0, 2276.1000000000]) {
					linear_extrude(height = 340.0000000000) {
						polygon(paths = [[0, 1, 2, 3]], points = [[605, 2635], [605, 2805], [775, 2805], [775, 2635]]);
					}
				}
			}
			color(c = [0.5000000000, 0.5000000000, 0.5000000000]) {
				translate(v = [0, 0, 2276.1000000000]) {
					linear_extrude(height = 340.0000000000) {
						polygon(paths = [[0, 1, 2, 3]], points = [[1065, 2635], [1065, 2805], [1235, 2805], [1235, 2635]]);
					}
				}
			}
			color(c = [0.5000000000, 0.5000000000, 0.5000000000]) {
				translate(v = [0, 0, 2276.1000000000]) {
					linear_extrude(height = 340.0000000000) {
						polygon(paths = [[0, 1, 2, 3]], points = [[1525, 2635], [1525, 2805], [1695, 2805], [1695, 2635]]);
					}
				}
			}
			color(c = [0.3000000000, 0.3000000000, 1]) {
				translate(v = [0, 0, 2616.1000000000]) {
					linear_extrude(height = 360.0000000000) {
						polygon(paths = [[0, 1, 2, 3]], points = [[0, -240], [0, 240], [1840, 240], [1840, -240]]);
					}
				}
			}
			color(c = [0.3000000000, 0.3000000000, 1]) {
				translate(v = [0, 0, 2616.1000000000]) {
					linear_extrude(height = 360.0000000000) {
						polygon(paths = [[0, 1, 2, 3]], points = [[0, 2480], [0, 2960], [1840, 2960], [1840, 2480]]);
					}
				}
			}
		}
	}
}
